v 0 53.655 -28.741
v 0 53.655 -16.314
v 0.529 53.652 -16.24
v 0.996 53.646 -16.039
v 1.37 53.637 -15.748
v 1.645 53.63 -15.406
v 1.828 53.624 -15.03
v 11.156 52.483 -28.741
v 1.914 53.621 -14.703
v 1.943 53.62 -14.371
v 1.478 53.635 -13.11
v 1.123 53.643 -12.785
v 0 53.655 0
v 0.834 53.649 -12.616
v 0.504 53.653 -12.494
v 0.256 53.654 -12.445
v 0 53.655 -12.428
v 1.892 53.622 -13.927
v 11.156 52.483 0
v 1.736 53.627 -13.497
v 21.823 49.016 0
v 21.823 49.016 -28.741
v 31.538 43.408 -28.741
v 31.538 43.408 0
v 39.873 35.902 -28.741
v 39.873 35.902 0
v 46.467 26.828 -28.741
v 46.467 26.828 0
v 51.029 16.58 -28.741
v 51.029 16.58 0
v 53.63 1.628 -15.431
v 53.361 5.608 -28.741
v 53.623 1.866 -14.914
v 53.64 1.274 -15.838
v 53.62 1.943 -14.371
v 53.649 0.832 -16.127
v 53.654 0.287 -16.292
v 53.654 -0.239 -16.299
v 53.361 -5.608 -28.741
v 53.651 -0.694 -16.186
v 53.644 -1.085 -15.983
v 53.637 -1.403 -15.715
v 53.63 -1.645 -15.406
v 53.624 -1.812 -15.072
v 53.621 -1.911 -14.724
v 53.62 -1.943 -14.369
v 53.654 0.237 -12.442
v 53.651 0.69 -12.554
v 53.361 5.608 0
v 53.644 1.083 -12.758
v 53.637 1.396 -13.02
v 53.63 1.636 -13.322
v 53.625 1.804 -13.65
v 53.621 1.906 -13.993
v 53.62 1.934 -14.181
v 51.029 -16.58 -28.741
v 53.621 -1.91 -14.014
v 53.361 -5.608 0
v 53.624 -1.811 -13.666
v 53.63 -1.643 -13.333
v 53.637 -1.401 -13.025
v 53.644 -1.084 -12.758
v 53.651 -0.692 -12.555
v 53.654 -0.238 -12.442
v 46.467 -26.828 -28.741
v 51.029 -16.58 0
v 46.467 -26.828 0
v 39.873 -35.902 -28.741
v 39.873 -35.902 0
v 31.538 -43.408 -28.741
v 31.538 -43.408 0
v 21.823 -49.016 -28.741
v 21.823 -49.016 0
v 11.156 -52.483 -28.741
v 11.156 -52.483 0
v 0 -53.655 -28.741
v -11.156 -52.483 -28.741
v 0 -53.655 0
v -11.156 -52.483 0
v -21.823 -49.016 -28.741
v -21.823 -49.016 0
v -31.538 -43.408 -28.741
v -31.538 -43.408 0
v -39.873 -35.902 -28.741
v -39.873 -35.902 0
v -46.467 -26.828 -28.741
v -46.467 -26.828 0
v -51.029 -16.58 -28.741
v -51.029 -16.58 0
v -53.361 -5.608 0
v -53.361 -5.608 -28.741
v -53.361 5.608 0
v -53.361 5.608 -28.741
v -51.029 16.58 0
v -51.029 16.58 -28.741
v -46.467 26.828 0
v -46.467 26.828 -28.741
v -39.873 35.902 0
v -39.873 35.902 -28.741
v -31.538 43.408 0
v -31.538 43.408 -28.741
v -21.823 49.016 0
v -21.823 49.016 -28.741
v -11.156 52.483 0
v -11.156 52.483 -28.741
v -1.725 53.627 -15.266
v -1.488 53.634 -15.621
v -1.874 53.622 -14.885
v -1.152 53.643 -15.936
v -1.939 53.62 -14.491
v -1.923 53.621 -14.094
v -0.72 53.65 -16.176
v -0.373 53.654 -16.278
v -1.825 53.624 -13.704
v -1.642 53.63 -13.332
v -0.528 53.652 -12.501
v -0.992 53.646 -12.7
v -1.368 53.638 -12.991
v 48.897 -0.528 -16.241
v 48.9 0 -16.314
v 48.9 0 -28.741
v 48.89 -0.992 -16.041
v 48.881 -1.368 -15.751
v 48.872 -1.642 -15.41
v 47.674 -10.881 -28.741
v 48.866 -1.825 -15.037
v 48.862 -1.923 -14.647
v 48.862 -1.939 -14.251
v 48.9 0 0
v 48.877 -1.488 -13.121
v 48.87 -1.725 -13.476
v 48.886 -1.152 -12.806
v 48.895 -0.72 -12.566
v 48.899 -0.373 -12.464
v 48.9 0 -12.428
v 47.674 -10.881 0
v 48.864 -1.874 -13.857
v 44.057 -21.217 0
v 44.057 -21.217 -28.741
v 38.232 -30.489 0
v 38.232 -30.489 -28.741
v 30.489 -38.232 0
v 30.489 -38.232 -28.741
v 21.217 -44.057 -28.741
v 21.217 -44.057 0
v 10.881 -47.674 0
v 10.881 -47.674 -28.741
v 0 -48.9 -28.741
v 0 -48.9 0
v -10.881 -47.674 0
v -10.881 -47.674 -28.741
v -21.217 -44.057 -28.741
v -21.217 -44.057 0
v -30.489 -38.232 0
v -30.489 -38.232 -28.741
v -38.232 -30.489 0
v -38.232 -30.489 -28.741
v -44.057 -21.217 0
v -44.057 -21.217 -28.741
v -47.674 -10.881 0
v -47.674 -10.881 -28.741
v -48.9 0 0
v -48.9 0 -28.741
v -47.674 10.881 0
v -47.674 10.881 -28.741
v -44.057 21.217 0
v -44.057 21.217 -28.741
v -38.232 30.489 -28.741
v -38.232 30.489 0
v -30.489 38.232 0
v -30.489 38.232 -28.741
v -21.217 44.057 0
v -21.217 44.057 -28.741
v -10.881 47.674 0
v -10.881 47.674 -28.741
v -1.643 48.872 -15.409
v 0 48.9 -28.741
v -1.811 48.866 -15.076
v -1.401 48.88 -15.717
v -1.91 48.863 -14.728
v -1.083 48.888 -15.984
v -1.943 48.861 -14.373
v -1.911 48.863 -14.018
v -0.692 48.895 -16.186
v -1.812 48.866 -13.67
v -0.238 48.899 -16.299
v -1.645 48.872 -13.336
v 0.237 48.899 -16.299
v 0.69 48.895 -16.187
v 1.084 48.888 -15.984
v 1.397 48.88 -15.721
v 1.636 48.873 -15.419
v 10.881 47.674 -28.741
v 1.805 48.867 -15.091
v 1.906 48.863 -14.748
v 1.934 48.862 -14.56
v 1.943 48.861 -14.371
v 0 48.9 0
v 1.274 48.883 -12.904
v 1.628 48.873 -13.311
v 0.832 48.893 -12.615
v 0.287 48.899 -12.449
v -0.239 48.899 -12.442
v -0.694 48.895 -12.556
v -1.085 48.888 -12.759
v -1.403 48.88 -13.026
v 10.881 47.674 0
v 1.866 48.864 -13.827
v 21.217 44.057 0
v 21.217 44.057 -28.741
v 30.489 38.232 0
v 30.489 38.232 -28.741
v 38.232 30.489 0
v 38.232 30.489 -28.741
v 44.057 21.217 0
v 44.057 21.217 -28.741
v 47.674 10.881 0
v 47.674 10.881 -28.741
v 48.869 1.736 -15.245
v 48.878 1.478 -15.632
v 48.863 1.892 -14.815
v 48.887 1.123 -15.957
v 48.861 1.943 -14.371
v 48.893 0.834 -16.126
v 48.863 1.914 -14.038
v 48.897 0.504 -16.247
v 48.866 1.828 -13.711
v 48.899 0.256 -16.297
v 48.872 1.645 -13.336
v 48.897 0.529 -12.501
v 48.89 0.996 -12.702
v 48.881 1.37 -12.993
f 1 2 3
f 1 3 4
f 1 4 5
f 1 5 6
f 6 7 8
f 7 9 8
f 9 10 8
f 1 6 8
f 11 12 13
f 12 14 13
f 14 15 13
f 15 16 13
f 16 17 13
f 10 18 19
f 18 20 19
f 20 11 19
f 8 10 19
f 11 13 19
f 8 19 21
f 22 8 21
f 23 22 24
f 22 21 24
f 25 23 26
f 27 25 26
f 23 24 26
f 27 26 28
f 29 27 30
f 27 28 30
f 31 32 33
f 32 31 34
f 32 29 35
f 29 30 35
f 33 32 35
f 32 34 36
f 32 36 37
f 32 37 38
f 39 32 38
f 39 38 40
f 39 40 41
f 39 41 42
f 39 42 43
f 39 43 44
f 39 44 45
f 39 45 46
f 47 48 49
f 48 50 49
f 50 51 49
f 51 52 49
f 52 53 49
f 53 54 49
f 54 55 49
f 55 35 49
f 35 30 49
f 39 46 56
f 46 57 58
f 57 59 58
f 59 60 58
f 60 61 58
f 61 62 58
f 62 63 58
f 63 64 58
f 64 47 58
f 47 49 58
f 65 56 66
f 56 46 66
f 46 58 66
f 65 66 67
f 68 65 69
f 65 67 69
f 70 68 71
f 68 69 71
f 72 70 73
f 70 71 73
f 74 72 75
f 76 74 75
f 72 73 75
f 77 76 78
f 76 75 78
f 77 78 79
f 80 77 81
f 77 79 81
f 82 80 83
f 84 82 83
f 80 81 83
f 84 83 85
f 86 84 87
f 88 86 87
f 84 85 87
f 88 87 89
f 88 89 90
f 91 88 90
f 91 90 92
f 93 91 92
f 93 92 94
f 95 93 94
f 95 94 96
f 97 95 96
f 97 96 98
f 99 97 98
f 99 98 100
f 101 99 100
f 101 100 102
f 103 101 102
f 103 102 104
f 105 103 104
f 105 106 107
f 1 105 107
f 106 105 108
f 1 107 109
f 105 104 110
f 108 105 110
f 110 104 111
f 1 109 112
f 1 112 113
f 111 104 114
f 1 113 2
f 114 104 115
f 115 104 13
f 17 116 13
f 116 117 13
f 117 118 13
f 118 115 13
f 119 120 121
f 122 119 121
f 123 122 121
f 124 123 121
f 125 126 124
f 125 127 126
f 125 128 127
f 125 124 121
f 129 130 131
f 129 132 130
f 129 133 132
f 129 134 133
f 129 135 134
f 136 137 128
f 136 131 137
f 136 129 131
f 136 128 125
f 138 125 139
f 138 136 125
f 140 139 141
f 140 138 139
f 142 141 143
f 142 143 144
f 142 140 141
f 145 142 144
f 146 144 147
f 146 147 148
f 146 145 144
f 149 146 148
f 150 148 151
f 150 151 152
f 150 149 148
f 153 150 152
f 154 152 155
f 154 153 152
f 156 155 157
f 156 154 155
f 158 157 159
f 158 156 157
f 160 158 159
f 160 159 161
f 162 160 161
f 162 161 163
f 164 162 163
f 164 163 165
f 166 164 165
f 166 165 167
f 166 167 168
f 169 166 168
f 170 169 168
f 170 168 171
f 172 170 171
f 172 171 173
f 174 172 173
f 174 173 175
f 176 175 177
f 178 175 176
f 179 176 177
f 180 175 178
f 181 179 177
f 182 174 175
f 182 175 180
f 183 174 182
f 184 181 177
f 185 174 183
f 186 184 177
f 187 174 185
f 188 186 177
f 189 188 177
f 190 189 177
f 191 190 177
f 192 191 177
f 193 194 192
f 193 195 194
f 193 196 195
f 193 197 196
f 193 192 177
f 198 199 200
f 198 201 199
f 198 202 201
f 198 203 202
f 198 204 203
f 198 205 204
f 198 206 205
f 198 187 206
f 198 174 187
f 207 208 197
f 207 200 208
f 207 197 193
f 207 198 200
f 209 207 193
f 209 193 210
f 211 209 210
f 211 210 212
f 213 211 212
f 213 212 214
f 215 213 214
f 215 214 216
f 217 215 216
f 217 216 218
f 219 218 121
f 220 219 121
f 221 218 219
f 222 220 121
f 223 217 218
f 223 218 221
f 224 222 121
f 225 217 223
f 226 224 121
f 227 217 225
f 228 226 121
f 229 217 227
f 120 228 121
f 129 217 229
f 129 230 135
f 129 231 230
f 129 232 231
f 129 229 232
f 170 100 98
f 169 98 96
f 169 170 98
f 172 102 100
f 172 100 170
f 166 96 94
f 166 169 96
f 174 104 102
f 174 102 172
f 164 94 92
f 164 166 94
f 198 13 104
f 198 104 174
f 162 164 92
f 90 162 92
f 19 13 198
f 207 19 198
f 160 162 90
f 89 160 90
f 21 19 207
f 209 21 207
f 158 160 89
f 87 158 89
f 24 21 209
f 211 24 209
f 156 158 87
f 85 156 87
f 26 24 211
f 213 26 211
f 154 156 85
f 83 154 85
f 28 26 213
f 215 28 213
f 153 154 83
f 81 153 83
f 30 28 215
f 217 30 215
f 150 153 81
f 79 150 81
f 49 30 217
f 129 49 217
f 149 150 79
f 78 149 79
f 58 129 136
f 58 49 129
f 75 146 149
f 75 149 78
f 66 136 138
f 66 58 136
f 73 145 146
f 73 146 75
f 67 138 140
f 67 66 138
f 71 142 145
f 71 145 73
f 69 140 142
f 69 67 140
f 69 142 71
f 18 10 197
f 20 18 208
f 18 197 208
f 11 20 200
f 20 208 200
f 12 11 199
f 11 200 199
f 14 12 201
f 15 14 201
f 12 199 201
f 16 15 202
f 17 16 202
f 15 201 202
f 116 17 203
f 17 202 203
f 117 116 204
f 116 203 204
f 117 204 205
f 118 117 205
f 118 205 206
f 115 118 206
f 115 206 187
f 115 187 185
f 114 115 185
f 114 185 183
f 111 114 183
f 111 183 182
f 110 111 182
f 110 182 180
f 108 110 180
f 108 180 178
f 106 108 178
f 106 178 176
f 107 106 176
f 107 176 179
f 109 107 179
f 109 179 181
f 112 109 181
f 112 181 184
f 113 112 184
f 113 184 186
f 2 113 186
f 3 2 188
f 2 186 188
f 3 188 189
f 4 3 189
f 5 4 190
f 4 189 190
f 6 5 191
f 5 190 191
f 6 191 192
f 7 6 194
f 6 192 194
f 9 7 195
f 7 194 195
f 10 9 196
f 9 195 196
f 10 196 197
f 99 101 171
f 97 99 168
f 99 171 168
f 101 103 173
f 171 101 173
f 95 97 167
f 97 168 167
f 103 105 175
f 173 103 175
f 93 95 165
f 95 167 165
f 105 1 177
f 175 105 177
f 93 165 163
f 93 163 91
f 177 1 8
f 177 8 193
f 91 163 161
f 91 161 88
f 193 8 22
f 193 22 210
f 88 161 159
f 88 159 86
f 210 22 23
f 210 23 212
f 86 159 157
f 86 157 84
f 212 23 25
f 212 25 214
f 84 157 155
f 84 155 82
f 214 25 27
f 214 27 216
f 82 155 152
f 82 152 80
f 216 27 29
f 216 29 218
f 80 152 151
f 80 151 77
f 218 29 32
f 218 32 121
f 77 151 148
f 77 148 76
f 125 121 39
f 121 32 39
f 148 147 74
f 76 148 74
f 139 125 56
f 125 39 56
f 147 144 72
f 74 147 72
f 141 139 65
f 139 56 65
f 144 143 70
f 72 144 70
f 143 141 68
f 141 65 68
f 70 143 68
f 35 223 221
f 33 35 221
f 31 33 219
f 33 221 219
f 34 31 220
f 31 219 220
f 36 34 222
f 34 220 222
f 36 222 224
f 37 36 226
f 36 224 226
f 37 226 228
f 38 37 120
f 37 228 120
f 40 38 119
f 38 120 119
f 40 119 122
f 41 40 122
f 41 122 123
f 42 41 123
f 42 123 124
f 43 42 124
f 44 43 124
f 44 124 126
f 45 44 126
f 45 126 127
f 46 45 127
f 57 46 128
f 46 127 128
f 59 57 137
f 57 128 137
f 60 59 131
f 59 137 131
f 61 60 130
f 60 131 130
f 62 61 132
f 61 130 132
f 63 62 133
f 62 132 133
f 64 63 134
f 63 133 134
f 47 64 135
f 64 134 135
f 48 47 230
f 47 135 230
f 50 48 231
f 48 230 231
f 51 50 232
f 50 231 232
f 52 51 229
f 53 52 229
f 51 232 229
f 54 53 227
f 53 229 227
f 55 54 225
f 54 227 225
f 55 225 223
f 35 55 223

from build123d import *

# Parameters (mm, degrees)
F0_W     = 53.655
F0_H     = 28.74146271
F1_W     = 48.9
F1_H     = 28.74146271
F6_D     = 3.8862
F6_DEPTH = 53.656
F7_D     = 3.8862
F7_DEPTH = 53.6560001


with BuildPart() as f4:
    # F0 (on Right) → F4 (revolve)
    with BuildSketch(Plane.YZ):
        with Locations((26.8275, -14.370731355)):
            Rectangle(F0_W, F0_H)
    revolve(axis=Axis((0, 0, -14.370731355), (0, 0, -1)))

    # F1 (on Front) → F5 (revolve, cut)
    with BuildSketch(Plane.XZ):
        with Locations((24.45, -14.370731355)):
            Rectangle(F1_W, F1_H)
    revolve(axis=Axis((0, 0, -14.370731355), (0, 0, -1)), mode=Mode.SUBTRACT)

    # F6 (through all, one way)
    with BuildSketch(Plane(origin=(0, 0, 0), x_dir=(0, 1, 0), z_dir=(-1, 0, 0))):
        with Locations((0, 14.370731355)):
            Circle(F6_D / 2)
    extrude(amount=-F6_DEPTH, mode=Mode.SUBTRACT)

    # F7 (through all, one way)
    with BuildSketch(Plane.XZ):
        with Locations((0, -14.370731355)):
            Circle(F7_D / 2)
    extrude(amount=-F7_DEPTH, mode=Mode.SUBTRACT)


solid = f4.part
